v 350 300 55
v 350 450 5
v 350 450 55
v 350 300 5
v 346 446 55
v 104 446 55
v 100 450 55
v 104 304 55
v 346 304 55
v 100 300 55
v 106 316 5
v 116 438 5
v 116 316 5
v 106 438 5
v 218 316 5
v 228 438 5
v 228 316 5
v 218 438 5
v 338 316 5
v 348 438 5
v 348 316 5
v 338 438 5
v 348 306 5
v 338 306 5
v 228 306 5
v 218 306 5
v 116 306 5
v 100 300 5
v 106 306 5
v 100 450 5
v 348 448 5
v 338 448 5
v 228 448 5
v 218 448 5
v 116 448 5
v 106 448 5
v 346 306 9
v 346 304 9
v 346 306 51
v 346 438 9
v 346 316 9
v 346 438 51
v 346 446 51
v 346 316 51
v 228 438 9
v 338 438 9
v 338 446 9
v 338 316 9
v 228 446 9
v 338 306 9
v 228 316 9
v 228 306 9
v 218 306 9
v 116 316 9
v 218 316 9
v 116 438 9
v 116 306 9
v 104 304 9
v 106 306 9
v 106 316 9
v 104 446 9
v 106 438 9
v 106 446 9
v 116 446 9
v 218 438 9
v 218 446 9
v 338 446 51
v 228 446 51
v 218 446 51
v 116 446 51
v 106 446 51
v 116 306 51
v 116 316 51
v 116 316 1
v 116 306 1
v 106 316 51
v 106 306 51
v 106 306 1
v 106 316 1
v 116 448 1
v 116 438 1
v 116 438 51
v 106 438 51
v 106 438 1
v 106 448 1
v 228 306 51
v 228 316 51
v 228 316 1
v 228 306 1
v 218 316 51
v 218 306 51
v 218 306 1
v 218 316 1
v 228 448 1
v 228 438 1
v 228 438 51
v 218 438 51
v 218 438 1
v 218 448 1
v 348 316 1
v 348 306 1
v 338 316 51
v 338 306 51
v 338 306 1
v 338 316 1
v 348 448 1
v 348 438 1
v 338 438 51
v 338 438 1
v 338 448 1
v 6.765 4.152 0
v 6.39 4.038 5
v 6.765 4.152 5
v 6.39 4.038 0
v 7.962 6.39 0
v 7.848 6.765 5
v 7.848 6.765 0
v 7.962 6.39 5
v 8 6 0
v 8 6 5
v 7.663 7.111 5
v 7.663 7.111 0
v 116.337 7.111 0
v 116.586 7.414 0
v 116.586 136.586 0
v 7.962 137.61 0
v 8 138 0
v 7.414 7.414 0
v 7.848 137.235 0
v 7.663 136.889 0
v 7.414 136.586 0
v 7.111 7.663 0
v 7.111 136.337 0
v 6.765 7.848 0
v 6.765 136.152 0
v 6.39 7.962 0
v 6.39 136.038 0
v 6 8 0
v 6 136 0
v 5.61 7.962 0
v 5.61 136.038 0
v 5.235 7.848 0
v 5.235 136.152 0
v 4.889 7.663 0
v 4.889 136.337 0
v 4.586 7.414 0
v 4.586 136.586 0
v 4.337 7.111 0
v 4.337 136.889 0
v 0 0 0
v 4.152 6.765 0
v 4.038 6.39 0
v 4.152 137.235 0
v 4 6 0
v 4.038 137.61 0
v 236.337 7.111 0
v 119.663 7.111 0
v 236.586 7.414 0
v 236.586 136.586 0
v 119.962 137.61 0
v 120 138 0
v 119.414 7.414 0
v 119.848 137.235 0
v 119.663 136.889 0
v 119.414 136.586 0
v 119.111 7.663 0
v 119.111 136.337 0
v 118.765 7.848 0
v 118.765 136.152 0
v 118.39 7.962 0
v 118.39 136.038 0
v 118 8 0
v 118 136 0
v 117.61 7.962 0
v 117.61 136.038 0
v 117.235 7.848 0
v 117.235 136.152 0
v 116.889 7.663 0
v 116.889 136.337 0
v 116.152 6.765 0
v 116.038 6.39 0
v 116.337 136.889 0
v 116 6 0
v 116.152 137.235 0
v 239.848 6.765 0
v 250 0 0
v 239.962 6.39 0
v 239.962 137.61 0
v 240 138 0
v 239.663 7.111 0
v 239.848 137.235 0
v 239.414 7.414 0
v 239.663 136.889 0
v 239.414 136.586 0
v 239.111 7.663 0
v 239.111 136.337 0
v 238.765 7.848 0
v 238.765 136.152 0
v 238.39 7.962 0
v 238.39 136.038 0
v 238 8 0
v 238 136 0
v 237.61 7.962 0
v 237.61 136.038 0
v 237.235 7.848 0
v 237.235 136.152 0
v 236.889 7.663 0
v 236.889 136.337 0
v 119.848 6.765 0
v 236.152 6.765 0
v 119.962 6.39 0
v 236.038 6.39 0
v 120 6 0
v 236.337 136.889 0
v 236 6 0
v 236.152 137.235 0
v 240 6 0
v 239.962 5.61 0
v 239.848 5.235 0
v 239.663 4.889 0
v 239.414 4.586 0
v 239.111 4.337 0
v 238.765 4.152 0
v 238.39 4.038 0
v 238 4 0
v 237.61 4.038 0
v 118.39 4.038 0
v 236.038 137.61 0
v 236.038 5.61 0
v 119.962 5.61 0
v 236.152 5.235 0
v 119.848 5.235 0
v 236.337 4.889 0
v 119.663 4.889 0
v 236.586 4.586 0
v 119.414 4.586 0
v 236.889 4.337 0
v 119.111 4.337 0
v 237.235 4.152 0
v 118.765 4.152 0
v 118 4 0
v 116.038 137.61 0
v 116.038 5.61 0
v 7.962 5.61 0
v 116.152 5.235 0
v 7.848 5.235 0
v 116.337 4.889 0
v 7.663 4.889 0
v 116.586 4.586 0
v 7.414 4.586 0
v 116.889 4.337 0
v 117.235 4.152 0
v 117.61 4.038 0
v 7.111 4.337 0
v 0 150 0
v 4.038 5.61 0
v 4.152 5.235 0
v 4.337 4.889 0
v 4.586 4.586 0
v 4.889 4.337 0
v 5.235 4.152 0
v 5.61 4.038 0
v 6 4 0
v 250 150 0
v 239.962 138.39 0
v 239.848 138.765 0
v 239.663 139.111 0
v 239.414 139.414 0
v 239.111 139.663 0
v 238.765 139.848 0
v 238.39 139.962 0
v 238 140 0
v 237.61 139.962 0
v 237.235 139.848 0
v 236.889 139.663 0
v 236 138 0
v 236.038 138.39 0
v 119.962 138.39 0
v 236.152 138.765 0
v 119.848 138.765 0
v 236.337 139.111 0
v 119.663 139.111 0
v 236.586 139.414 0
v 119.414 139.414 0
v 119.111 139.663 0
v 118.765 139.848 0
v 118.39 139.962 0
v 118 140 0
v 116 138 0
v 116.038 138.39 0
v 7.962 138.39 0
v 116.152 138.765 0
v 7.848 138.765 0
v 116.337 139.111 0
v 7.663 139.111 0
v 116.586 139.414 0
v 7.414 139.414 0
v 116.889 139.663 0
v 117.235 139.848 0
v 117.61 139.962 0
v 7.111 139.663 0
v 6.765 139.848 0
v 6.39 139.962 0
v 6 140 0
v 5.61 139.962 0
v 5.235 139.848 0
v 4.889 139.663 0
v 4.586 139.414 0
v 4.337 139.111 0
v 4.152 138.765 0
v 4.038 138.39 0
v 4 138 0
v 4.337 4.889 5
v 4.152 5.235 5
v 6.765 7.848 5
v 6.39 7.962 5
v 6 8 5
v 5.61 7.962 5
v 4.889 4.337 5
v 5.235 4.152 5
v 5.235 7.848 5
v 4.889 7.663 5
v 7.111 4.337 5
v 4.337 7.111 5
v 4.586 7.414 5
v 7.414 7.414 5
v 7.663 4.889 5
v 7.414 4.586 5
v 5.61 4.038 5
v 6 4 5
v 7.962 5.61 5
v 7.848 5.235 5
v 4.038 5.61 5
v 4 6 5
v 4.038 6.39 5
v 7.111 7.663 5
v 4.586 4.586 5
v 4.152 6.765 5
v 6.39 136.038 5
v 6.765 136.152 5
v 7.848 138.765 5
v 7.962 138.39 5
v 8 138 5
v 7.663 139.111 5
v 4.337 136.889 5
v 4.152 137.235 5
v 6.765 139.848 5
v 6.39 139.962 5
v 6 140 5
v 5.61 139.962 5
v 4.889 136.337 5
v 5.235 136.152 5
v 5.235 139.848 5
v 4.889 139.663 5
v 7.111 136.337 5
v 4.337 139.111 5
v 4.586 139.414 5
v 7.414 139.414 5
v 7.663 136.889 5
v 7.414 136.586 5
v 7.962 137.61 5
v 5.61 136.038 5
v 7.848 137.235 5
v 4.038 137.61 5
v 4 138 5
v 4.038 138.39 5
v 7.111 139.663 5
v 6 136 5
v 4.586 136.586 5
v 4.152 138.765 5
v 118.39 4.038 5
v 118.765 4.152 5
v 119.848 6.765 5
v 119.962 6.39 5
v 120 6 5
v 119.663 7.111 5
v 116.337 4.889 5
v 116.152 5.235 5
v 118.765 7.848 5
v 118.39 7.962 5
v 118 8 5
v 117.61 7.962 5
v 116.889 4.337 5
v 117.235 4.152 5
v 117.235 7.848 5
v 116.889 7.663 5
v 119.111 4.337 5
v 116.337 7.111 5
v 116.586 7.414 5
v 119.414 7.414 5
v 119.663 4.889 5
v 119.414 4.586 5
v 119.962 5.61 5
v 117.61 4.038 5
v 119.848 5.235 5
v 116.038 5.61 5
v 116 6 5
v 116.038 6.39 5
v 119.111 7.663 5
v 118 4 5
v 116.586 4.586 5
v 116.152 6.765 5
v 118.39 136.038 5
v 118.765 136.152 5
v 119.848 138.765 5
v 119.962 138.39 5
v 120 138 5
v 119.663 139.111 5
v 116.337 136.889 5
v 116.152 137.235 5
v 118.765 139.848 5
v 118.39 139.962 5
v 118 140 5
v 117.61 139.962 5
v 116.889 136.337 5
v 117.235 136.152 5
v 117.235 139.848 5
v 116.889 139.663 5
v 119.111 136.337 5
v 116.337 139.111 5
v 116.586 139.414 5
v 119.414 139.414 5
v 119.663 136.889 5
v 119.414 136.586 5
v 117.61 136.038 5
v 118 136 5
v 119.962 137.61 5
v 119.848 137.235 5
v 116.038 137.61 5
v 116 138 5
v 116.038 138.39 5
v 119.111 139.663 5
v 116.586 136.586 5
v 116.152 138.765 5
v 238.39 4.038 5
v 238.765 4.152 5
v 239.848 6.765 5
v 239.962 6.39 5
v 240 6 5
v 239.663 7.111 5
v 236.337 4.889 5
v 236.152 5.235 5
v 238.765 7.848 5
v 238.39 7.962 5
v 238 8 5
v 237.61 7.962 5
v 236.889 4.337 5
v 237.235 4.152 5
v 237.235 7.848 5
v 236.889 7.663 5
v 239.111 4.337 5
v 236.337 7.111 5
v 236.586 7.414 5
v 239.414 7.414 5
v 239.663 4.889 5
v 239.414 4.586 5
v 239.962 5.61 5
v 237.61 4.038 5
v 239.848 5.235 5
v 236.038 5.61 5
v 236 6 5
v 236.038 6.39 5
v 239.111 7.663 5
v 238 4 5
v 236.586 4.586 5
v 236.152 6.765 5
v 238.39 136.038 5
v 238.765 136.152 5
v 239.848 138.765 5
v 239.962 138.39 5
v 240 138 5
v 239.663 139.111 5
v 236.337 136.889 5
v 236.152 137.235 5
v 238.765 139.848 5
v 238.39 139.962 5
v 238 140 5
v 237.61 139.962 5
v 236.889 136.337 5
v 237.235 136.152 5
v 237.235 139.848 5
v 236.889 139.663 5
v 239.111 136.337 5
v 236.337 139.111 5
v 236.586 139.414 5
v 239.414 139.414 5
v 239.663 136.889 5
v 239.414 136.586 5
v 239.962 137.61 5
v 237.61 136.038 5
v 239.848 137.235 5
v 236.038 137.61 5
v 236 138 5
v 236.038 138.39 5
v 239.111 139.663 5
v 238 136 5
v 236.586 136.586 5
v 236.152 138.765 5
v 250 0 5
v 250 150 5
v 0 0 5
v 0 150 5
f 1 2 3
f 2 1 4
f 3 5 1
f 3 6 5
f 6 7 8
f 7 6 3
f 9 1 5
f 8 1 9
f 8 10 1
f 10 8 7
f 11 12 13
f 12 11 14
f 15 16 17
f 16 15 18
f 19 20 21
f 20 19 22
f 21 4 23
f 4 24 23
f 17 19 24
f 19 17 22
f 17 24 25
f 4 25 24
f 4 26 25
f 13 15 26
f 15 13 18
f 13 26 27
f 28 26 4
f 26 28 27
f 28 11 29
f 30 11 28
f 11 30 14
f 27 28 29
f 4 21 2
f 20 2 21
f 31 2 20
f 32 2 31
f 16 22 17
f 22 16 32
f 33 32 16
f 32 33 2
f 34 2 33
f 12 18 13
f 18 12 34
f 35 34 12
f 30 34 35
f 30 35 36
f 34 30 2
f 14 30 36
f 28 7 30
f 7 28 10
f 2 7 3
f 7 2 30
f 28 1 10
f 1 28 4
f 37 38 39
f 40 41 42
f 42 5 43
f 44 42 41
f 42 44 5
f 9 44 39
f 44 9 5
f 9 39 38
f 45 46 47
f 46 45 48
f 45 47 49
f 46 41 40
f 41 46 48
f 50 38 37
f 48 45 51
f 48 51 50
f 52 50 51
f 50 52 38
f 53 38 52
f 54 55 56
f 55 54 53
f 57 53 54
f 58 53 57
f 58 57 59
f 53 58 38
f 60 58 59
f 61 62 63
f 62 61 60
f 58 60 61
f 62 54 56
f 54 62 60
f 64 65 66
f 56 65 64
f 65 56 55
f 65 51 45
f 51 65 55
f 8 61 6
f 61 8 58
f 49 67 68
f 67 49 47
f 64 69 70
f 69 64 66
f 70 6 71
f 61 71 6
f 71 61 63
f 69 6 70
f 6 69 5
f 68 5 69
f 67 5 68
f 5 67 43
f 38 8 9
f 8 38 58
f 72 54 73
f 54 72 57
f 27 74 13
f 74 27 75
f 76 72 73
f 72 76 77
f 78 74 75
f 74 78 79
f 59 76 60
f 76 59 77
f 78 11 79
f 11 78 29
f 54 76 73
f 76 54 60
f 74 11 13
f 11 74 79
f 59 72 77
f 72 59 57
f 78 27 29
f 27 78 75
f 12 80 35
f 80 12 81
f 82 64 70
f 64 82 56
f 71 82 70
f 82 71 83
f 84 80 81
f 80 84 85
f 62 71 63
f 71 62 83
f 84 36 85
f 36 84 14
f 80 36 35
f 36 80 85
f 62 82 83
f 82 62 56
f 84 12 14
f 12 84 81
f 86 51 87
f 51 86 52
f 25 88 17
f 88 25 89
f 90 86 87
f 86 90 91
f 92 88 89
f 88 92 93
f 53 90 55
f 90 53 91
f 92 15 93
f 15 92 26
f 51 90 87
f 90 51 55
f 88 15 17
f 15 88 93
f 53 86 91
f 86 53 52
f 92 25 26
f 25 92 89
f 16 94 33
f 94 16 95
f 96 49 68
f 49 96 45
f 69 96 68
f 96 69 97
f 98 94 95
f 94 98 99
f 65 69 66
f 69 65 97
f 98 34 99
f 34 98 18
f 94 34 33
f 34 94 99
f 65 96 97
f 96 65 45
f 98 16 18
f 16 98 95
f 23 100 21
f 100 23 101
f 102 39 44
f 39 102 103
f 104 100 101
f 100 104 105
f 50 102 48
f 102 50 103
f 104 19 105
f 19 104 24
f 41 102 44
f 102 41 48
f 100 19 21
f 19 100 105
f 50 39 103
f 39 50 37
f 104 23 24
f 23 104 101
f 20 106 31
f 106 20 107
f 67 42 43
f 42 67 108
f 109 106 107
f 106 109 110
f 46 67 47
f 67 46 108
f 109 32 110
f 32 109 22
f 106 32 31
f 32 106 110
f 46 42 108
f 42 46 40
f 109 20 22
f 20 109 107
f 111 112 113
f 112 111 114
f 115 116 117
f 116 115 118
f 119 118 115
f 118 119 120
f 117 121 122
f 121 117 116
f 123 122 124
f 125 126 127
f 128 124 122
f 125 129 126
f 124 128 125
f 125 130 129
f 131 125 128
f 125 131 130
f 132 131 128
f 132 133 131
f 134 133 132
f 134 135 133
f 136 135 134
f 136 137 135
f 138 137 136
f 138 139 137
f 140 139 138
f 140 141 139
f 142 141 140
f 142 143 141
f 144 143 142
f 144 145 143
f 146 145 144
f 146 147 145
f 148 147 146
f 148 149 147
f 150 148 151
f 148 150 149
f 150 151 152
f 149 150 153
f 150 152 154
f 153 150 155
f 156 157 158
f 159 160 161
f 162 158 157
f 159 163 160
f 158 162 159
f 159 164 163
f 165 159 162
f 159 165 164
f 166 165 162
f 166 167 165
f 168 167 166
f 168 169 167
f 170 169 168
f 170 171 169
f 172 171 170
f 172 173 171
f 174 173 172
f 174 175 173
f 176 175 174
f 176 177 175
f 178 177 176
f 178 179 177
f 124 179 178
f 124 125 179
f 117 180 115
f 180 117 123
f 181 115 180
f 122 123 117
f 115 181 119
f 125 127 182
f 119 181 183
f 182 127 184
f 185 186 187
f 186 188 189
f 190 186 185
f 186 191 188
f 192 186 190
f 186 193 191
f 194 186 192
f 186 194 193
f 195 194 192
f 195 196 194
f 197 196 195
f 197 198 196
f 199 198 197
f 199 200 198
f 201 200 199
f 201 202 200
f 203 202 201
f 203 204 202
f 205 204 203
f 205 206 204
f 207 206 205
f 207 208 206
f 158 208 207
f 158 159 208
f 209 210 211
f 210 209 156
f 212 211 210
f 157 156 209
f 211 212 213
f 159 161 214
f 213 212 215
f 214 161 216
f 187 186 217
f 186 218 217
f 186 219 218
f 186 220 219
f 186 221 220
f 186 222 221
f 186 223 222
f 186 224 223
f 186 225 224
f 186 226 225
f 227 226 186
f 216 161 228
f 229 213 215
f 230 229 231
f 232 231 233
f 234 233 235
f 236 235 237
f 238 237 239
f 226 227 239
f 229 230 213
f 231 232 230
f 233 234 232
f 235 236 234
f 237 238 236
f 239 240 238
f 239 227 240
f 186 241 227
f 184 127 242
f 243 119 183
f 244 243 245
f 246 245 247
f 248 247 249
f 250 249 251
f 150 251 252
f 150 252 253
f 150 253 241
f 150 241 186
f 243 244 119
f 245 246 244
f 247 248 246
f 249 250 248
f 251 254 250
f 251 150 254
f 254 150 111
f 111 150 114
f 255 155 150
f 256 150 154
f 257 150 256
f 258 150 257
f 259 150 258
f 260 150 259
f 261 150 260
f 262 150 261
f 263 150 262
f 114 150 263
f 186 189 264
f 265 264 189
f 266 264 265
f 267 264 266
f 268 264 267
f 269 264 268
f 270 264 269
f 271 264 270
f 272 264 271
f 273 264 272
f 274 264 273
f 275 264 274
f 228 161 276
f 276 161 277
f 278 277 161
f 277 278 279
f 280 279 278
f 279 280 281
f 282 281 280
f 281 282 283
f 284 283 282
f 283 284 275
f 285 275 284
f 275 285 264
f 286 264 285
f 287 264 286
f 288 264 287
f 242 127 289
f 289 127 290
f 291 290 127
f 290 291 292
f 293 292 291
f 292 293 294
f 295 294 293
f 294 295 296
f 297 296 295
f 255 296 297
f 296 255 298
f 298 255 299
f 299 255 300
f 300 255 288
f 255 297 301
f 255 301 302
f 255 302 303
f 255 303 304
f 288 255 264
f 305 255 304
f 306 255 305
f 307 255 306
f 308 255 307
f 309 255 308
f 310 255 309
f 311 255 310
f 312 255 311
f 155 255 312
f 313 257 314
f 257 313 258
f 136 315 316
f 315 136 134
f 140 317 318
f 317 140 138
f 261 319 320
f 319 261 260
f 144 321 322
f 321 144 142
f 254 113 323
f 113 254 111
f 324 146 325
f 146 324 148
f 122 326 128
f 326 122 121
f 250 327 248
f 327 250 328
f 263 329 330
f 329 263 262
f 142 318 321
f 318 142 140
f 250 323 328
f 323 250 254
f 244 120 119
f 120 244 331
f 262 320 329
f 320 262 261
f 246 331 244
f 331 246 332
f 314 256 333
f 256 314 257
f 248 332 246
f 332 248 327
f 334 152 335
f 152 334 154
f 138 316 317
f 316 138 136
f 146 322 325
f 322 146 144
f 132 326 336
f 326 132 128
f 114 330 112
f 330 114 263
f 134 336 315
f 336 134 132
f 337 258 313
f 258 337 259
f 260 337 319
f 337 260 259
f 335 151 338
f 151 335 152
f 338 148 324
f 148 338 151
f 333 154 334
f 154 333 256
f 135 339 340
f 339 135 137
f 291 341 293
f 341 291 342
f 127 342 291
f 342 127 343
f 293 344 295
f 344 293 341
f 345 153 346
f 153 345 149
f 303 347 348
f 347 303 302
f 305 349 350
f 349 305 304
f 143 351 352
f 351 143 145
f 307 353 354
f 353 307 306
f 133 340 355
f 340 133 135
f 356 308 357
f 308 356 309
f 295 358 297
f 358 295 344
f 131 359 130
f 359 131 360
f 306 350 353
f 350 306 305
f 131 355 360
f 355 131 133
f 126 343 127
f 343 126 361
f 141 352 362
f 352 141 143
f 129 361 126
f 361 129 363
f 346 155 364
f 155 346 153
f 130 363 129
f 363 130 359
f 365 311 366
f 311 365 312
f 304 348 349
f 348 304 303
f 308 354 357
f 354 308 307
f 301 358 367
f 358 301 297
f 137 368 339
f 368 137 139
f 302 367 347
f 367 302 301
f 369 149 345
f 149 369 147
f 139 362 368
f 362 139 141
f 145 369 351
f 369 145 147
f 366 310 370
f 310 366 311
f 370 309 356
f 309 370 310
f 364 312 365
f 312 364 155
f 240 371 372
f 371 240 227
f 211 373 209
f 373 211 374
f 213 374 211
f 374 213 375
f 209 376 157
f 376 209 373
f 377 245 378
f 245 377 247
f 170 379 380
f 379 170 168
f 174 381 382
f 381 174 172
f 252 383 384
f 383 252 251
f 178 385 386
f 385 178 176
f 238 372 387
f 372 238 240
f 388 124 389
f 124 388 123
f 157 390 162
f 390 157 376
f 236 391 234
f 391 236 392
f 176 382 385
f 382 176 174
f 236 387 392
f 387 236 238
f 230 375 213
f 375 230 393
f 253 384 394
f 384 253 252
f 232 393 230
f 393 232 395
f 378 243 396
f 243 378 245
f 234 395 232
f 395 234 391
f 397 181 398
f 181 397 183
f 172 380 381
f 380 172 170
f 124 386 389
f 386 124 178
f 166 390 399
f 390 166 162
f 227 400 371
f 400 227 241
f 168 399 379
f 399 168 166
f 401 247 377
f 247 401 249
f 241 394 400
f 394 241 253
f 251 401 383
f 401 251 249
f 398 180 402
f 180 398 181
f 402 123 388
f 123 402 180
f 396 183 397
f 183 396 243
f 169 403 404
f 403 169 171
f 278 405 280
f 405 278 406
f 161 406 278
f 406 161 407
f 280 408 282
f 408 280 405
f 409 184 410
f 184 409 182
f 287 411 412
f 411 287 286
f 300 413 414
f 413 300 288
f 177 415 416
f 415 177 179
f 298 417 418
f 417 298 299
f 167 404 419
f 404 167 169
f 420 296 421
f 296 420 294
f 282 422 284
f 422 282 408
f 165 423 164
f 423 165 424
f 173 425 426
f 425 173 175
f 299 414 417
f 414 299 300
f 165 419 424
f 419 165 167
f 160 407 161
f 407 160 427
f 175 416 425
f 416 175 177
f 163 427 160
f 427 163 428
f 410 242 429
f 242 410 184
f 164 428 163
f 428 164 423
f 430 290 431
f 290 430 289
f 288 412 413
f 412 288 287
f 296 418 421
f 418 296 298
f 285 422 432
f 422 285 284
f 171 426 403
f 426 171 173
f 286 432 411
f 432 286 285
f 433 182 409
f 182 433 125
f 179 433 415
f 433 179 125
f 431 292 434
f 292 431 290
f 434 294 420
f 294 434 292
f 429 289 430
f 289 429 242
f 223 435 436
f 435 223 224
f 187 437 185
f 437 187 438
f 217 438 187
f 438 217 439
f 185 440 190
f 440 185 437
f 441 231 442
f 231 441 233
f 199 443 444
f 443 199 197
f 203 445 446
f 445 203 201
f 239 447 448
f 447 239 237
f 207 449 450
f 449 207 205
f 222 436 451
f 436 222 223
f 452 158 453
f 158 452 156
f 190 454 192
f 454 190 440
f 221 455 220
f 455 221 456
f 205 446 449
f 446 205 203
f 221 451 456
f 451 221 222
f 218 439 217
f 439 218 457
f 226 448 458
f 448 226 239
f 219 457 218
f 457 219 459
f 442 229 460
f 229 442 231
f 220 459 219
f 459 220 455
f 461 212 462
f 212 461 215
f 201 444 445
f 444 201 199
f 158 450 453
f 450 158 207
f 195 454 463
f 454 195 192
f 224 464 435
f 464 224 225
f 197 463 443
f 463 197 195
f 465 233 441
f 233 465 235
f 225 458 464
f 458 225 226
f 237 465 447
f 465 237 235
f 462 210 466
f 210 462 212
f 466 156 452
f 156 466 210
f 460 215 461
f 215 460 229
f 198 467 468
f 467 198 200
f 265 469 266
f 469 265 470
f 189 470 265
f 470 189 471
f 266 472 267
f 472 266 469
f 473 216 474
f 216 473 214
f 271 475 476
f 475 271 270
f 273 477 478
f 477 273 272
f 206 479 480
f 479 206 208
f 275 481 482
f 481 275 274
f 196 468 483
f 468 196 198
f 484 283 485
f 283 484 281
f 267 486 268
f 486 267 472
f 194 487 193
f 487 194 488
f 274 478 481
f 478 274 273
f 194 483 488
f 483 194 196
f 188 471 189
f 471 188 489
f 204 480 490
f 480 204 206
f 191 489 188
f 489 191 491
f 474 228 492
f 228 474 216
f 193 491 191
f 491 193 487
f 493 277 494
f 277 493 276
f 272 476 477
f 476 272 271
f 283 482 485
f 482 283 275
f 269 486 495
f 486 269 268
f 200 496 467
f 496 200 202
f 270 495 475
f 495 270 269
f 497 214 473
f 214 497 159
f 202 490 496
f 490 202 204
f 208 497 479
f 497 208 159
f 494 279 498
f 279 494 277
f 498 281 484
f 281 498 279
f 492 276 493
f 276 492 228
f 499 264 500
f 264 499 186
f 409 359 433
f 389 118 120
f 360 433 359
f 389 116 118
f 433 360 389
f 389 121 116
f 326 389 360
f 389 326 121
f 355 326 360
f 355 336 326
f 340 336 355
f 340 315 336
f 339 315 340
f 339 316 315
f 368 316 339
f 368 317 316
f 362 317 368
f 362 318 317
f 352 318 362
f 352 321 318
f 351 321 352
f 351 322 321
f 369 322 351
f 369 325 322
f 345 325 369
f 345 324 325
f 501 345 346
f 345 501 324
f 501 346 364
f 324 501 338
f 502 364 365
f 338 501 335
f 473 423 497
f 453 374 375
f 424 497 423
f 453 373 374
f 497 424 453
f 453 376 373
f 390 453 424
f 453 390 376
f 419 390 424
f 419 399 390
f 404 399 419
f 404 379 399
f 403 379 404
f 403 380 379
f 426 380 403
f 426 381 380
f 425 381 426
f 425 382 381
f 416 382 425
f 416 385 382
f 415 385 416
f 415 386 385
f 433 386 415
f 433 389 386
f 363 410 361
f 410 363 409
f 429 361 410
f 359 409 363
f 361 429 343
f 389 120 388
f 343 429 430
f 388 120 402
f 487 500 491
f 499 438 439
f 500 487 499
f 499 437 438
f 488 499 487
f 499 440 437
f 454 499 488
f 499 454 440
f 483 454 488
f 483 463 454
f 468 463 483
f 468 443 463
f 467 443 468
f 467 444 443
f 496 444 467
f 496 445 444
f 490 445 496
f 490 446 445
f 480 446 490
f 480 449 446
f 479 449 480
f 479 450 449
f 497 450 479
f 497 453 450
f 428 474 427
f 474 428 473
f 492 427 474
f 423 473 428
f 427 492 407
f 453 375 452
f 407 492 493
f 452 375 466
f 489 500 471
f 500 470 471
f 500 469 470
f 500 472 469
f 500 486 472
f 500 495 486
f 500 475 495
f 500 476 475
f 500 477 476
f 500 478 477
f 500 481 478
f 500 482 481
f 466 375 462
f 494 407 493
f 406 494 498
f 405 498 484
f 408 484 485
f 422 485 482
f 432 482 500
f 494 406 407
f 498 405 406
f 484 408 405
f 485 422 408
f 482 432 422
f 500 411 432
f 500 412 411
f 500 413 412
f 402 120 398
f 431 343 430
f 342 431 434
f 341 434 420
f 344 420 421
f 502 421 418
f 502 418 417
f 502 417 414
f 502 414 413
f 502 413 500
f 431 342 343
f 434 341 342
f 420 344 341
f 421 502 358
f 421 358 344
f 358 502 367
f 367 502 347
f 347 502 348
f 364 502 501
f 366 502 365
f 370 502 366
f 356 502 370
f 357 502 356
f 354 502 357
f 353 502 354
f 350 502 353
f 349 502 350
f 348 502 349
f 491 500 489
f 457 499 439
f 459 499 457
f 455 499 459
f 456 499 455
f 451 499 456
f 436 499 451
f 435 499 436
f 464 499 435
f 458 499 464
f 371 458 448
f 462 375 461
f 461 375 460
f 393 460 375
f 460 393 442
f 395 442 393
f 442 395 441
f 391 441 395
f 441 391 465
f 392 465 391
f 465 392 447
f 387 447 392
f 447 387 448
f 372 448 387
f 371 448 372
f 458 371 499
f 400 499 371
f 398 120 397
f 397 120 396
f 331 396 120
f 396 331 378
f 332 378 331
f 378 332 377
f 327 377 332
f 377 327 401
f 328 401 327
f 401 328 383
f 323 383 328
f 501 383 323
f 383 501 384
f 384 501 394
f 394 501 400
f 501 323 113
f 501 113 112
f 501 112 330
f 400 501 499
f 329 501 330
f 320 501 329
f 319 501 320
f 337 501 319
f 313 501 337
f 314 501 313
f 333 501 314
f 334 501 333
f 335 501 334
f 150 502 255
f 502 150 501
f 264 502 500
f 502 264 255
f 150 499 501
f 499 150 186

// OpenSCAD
// Global params.
box_width = 250;
box_depth = 150;
box_height = 50;
lid_height = box_height / 10;
wall_thickness = 4;
screw_diameter = 4;
screw_head_diameter = 8;
screw_head_height = 2;
corner_padding = 10;

// Screw coords.
post_x_coords = [
    2 * wall_thickness,
    box_width / 2 - 0.5 * corner_padding,
    box_width - corner_padding
];
    
post_y_coords = [
    2 * wall_thickness,
    box_depth - corner_padding
];

// Function to create the hollow box with corner posts for screws
module main_box() {
    // Box.
    difference() {
        cube([box_width, box_depth, box_height]);

        // Hollow it out.
        translate([
            wall_thickness,
            wall_thickness,
            wall_thickness
        ])
        
        cube([
            box_width - 2 * wall_thickness,
            box_depth - 2 * wall_thickness,
            box_height - wall_thickness,
        ]);
    }
    
    for (x = post_x_coords) {
        for (y = post_y_coords) {
            translate([
                x - screw_diameter / 2,
                y - screw_diameter / 2,
                -wall_thickness
            ])
            
            cube([corner_padding, corner_padding, box_height]);
        }
    }
}

module sockets() {
    //
}

module box() {
    difference() {
        main_box();
        sockets();
    }
}

// Lid/faceplate.
module main_lid() {
    difference() {
        // Lid shape
        cube([box_width, box_depth, lid_height]);

        // Holes for the screws in the lid
        for (x = post_x_coords) {
            for (y = post_y_coords) {
                translate([
                    x - screw_diameter / 2,
                    y - screw_diameter / 2, 0
                ])
                
                cylinder(h = lid_height + 1,
                         d = screw_diameter,
                         $fn = 32);
            }
        }
    }
}

module faceplate_arrangement() {
    //
}

module lid() {
    difference() {
        main_lid();
        faceplate_arrangement();
    }
}

module main() {
    translate([100, 300, lid_height])
    box();
    lid();
}

main();
